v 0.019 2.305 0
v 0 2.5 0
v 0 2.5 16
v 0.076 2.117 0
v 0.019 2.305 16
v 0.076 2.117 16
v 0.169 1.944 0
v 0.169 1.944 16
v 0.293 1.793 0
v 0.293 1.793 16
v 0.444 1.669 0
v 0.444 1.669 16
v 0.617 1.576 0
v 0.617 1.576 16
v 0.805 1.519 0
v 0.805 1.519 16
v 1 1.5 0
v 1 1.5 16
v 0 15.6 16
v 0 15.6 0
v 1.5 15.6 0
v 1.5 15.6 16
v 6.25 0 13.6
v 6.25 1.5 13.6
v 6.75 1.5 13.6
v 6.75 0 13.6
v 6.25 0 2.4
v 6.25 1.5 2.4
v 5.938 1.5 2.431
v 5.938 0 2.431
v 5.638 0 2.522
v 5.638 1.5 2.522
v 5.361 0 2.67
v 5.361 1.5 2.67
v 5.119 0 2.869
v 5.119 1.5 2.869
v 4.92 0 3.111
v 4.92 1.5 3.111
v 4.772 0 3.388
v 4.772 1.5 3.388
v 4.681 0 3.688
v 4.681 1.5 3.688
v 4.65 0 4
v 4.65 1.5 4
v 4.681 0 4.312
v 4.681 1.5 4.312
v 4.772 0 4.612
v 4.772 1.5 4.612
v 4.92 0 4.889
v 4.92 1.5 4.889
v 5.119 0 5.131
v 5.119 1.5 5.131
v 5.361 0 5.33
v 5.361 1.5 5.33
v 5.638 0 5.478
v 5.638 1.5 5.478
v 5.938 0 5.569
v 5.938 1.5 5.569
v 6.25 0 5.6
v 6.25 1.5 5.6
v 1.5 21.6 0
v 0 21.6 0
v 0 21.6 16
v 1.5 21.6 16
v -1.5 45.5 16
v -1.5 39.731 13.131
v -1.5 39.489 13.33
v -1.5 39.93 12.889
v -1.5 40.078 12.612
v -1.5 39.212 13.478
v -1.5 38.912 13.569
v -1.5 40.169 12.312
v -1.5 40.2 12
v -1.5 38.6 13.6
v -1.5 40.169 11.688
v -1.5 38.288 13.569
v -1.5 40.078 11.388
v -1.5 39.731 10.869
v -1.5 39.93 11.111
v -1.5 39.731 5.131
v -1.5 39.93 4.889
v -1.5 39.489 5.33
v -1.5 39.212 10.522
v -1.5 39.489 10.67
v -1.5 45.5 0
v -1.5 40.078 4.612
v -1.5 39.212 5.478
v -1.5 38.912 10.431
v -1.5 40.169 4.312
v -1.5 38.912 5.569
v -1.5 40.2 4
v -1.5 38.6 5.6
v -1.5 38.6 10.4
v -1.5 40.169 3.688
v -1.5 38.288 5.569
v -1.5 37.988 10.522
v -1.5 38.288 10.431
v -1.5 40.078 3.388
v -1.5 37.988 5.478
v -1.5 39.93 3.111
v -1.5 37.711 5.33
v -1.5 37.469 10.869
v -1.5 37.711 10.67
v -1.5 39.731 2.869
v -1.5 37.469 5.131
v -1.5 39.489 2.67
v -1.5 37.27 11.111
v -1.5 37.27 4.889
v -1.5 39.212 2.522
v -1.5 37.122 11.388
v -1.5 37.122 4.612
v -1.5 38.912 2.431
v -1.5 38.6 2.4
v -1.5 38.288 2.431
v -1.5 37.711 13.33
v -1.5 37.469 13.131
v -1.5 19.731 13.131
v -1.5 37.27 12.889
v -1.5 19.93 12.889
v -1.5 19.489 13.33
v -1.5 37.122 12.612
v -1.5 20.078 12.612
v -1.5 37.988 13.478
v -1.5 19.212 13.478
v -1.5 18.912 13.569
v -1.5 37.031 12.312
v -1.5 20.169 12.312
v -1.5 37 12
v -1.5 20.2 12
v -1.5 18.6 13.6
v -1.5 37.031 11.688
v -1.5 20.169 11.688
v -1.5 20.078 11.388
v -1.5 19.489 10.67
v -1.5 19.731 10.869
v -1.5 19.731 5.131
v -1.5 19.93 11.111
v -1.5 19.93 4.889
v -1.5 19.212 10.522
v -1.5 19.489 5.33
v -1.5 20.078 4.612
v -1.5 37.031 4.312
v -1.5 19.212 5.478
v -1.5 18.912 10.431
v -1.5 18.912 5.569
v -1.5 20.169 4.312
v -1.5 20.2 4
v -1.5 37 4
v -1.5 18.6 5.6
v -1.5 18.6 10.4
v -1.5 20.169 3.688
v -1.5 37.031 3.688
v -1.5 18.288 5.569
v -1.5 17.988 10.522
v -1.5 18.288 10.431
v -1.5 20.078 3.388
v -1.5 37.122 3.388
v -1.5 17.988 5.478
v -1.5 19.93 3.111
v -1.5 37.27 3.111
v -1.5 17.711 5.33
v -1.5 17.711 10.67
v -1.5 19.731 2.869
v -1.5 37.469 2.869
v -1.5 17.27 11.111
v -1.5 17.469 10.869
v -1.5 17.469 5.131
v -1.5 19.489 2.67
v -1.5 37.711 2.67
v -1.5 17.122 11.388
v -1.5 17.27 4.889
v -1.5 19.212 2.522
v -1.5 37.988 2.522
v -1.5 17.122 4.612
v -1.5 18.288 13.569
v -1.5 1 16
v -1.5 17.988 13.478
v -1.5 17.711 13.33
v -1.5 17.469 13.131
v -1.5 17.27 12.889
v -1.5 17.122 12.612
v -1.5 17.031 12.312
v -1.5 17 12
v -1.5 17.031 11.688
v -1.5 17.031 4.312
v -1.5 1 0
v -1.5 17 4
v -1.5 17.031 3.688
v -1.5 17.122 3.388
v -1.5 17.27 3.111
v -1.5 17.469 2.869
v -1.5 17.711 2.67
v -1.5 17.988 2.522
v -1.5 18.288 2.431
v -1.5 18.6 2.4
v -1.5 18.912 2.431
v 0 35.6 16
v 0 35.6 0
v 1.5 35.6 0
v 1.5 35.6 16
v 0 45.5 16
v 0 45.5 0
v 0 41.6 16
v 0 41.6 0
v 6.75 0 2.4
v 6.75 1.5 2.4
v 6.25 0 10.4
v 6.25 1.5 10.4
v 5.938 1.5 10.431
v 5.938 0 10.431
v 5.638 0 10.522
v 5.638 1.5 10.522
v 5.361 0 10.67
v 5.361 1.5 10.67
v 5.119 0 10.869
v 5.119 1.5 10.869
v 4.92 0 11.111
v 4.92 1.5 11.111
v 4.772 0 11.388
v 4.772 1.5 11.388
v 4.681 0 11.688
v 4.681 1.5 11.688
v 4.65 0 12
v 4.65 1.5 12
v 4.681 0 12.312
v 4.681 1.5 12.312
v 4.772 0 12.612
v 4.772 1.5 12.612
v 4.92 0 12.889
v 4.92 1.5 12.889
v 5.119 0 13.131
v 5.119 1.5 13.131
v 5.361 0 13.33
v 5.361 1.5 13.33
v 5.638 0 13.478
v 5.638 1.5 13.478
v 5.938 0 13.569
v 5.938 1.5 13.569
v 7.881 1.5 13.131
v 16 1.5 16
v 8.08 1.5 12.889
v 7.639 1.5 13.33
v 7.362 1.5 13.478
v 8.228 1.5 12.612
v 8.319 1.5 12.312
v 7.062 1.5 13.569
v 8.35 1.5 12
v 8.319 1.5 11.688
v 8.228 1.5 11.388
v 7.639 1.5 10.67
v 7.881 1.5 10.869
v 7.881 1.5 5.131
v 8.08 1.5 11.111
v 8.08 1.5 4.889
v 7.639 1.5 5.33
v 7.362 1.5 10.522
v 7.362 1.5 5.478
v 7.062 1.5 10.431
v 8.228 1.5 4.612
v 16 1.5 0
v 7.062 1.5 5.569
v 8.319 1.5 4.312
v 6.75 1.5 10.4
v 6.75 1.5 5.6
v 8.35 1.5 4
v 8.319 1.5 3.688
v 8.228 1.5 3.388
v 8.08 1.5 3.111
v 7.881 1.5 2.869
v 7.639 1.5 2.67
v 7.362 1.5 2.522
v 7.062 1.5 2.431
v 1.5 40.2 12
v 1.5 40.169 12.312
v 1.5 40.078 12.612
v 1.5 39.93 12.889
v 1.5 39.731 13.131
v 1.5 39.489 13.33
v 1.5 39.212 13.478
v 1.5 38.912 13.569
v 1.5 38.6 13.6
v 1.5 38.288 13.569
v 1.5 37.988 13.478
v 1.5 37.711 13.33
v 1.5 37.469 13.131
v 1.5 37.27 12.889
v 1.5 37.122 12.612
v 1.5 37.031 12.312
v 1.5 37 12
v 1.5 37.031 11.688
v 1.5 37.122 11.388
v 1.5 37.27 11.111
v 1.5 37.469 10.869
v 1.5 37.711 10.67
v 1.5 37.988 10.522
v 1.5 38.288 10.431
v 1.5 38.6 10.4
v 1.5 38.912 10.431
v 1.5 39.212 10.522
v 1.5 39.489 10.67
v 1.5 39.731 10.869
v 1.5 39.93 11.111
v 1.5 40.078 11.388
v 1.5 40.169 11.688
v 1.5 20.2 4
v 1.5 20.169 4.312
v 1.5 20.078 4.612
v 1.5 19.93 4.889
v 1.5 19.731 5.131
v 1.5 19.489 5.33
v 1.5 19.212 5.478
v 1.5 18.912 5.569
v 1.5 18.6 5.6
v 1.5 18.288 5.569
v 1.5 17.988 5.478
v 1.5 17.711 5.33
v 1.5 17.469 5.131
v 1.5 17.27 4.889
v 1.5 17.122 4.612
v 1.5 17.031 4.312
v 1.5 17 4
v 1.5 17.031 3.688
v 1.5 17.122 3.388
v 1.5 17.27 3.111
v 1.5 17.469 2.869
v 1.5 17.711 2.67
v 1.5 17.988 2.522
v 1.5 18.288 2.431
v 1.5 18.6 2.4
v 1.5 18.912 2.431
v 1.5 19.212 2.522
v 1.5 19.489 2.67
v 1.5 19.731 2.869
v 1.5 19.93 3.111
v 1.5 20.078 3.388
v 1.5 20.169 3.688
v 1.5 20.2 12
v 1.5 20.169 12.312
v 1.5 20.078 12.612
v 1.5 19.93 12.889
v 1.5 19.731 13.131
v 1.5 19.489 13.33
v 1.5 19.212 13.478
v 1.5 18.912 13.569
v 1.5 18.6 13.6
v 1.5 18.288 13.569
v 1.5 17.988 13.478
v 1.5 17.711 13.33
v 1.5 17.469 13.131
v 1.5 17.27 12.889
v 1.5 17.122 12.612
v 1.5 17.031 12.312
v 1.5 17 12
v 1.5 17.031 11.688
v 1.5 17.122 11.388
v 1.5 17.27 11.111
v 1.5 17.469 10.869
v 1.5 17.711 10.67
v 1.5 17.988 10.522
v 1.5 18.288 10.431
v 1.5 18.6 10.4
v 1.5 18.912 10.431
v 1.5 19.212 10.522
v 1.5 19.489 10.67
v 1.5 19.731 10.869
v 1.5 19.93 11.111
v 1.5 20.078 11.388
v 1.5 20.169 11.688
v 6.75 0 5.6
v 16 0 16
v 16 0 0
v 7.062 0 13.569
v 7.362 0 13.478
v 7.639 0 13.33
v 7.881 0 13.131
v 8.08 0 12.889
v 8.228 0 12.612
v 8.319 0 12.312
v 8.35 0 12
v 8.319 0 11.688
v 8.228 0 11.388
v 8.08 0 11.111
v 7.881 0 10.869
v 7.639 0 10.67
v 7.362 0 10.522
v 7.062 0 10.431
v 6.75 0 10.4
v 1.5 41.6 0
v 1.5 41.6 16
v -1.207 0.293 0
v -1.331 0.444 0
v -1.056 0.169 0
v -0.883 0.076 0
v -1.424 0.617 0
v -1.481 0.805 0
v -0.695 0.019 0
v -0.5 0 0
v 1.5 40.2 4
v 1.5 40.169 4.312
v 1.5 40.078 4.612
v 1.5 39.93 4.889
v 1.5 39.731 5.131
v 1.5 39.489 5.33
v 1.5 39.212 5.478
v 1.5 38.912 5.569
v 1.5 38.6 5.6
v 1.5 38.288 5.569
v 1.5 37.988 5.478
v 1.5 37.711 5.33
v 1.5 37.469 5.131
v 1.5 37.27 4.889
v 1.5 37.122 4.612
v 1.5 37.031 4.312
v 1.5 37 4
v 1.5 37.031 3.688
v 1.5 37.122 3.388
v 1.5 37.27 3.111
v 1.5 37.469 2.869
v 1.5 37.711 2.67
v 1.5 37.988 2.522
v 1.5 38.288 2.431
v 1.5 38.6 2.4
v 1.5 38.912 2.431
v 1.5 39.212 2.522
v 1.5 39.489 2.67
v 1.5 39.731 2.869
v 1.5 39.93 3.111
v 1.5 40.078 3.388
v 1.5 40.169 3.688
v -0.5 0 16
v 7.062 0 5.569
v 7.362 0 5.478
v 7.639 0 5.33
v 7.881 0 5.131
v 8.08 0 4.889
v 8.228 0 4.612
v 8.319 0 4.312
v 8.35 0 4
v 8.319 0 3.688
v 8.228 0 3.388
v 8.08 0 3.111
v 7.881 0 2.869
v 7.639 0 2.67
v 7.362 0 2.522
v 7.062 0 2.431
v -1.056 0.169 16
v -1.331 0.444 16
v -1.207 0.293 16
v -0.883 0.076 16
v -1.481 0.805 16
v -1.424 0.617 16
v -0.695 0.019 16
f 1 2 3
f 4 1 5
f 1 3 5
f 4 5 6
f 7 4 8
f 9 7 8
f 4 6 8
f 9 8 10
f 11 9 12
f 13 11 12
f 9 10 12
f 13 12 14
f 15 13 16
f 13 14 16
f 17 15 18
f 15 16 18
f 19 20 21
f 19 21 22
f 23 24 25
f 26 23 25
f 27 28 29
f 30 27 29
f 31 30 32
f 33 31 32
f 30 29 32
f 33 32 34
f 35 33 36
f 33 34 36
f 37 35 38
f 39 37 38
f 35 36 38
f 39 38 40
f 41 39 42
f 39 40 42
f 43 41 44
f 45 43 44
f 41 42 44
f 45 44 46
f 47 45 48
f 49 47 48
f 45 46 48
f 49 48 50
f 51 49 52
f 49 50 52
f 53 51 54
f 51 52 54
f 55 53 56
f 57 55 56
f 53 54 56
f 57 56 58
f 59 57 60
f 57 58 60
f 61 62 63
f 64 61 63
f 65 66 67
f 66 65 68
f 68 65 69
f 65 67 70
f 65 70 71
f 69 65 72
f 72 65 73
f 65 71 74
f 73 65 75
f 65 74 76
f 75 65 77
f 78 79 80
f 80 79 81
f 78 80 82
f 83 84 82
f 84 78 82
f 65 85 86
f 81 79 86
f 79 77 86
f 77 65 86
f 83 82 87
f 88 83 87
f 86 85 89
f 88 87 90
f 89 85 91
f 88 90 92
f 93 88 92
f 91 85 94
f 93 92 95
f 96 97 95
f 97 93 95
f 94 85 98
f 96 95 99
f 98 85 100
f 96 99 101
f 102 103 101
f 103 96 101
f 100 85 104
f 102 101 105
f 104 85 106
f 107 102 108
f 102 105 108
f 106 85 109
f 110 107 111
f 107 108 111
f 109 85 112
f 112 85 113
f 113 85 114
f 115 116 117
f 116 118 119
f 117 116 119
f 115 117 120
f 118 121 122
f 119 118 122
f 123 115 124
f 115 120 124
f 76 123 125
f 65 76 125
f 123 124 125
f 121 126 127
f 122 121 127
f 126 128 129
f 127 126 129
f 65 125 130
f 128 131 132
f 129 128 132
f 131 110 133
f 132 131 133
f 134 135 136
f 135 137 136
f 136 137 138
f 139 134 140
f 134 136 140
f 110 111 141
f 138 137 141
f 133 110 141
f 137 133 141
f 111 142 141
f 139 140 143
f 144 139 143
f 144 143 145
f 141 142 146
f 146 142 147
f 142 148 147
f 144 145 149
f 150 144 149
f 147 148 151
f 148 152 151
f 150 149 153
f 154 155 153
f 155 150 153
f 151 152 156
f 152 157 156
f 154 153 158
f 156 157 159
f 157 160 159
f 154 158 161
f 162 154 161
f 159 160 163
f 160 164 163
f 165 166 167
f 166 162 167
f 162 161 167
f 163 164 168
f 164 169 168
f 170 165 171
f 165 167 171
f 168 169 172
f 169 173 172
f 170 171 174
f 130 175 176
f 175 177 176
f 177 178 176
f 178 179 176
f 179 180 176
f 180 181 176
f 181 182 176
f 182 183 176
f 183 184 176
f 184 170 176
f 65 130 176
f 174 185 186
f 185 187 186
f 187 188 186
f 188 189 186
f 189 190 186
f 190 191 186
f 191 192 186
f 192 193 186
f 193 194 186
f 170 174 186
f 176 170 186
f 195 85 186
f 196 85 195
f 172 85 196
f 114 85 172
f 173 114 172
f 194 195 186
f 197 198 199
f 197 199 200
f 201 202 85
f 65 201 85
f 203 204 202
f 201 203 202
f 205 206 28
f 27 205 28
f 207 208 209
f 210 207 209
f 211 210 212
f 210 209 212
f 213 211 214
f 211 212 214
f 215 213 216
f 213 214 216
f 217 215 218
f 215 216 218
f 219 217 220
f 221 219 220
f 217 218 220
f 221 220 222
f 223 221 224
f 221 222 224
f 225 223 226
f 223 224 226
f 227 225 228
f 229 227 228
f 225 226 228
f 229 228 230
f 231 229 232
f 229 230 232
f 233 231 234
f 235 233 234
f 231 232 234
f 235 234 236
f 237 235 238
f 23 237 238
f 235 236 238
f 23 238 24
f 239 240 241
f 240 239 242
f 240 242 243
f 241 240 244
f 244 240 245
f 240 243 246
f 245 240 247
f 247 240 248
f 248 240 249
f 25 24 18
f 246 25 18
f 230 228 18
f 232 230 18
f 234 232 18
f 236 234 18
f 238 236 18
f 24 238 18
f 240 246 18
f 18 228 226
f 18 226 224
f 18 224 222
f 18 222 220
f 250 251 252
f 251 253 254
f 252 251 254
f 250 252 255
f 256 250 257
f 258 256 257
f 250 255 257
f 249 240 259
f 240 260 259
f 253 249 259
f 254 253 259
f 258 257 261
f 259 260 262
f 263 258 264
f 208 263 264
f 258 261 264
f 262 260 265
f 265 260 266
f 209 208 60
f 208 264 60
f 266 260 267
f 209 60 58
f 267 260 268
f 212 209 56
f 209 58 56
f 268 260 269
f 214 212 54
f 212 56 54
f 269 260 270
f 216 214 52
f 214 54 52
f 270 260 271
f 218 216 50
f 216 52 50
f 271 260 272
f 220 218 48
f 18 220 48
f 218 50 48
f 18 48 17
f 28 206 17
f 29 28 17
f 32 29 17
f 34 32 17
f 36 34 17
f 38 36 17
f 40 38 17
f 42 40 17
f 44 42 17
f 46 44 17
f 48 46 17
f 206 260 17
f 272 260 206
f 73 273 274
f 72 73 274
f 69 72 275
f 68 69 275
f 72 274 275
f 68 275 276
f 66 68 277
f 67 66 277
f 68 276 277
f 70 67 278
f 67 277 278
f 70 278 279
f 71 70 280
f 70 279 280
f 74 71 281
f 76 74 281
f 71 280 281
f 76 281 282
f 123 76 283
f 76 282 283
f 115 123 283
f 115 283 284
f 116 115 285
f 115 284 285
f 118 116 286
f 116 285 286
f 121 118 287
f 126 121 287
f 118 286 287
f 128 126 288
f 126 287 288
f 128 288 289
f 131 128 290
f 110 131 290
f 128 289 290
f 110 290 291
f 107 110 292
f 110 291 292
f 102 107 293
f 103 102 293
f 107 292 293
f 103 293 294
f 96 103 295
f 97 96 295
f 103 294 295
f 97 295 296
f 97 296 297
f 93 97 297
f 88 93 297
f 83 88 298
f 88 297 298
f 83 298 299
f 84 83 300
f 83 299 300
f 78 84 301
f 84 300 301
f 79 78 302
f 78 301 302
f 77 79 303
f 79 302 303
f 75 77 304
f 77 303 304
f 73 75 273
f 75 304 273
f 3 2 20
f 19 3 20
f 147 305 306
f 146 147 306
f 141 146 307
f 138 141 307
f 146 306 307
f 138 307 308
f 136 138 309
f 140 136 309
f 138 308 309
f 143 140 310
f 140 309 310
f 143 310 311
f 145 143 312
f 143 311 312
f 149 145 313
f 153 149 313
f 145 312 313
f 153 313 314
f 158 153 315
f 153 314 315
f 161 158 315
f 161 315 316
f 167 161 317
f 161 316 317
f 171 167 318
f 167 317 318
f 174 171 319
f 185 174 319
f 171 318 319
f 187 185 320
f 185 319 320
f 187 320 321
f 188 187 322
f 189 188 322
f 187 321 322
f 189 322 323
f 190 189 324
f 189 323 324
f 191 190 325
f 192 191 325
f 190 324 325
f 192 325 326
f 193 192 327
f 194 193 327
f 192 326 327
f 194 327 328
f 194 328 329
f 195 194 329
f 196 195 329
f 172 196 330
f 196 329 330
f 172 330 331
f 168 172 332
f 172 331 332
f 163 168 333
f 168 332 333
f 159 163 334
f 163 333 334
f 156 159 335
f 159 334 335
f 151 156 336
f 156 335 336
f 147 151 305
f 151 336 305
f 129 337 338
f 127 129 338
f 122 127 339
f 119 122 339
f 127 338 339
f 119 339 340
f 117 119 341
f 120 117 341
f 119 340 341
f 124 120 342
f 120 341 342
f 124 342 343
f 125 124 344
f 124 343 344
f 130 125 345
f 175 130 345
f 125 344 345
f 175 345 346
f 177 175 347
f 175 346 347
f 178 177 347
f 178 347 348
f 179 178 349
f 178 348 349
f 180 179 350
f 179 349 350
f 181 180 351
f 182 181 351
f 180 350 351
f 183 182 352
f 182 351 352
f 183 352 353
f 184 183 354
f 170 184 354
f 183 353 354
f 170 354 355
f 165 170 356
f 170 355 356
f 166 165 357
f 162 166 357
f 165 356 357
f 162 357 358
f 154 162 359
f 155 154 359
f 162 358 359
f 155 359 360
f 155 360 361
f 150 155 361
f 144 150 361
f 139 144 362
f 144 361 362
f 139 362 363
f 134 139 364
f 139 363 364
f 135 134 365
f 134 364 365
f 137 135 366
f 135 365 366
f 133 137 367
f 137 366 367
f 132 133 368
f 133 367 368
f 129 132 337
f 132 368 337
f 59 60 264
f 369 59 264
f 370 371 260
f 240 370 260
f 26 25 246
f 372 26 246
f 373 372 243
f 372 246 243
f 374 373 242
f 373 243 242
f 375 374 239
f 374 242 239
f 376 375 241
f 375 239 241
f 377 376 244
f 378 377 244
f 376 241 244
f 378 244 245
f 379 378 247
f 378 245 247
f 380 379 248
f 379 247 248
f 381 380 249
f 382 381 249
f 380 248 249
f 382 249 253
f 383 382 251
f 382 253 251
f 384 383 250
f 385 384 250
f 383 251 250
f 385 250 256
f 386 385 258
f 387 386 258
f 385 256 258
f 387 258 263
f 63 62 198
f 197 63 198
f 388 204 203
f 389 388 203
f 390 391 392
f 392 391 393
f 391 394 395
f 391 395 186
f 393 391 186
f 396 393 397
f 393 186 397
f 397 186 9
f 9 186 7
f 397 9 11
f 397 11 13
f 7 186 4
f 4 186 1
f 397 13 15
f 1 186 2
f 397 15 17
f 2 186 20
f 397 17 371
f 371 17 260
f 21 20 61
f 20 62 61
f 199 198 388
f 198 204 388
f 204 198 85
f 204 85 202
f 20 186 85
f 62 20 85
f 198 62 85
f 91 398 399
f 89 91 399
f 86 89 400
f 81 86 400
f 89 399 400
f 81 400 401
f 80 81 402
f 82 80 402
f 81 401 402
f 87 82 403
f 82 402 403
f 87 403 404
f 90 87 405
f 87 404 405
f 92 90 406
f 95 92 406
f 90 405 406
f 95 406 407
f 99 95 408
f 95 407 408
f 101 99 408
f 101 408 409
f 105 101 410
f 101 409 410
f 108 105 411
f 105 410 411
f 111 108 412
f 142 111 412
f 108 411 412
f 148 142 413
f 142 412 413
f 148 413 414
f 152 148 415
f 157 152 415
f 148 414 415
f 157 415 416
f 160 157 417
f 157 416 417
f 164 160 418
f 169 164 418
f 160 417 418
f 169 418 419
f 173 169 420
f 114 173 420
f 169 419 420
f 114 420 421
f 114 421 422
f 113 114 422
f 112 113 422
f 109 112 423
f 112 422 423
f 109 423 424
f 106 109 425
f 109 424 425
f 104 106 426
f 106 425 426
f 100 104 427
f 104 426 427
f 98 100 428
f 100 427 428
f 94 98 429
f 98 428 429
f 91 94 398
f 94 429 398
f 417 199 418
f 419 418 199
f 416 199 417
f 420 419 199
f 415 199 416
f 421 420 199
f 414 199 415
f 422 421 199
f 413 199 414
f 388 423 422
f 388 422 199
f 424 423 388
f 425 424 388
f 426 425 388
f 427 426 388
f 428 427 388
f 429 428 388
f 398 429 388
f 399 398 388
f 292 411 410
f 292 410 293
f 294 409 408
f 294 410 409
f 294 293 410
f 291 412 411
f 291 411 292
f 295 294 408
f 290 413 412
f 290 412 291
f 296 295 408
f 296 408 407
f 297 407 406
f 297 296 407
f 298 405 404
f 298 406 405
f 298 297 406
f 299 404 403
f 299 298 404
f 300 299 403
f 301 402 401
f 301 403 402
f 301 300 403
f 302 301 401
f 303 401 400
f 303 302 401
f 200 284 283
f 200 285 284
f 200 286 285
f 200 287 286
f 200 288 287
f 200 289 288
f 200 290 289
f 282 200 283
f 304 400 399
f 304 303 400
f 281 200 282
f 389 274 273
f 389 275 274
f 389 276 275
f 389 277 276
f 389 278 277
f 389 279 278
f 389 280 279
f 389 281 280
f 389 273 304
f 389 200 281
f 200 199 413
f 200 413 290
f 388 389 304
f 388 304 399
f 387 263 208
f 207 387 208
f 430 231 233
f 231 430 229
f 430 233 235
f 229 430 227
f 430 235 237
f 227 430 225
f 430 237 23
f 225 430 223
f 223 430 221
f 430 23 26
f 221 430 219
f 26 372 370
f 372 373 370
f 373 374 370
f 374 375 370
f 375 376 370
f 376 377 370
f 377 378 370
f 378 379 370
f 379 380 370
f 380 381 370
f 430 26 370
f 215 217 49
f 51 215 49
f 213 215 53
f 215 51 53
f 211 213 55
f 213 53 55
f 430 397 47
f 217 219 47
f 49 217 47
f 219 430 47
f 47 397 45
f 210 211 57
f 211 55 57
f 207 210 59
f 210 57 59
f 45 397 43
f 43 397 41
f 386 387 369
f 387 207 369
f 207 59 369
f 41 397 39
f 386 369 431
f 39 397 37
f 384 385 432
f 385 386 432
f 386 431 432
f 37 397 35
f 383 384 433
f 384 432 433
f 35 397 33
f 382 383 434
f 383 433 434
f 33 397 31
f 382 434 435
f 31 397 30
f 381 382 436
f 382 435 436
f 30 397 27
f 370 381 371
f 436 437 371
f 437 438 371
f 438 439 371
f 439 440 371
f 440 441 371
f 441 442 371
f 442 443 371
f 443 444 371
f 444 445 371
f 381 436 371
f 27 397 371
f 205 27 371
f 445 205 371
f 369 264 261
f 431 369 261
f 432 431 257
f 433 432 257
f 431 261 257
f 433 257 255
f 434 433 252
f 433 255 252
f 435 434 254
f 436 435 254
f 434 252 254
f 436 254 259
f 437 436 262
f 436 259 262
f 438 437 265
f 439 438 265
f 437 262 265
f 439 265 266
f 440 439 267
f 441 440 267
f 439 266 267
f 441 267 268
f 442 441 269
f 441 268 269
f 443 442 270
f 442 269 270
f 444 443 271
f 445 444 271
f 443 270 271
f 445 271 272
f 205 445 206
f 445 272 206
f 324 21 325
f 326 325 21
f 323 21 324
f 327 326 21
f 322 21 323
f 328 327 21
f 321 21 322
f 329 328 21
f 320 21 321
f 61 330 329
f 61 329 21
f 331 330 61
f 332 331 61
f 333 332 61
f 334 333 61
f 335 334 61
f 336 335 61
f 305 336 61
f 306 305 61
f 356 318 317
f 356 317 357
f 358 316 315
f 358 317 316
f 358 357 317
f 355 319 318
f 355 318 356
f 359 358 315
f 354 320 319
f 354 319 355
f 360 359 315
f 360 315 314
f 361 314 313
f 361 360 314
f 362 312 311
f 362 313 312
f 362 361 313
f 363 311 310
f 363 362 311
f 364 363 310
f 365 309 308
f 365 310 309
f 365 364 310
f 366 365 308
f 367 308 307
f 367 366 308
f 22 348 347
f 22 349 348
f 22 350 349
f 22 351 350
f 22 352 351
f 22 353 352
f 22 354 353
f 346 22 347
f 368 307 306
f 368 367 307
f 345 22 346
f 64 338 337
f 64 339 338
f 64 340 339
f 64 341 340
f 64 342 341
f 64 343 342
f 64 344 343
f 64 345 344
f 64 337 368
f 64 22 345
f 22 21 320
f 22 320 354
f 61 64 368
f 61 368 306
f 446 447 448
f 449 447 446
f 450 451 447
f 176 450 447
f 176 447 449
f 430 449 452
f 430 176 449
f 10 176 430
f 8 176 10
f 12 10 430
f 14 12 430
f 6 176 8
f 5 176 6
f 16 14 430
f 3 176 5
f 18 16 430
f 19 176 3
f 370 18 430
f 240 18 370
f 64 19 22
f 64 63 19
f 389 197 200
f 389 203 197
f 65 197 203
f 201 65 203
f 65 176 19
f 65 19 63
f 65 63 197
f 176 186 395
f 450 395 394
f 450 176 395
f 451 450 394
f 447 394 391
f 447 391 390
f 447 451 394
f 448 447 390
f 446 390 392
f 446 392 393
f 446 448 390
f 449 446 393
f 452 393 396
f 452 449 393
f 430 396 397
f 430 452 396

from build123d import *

# Parameters (mm, degrees)
F1_DEPTH = 16
F2_R     = 1
F3_R     = 1
F5_DEPTH = 1.5
F6_W     = 6
F6_H     = 16
F7_DEPTH = 1.5
F8_R     = 1.6
F9_DEPTH = 3


with BuildPart() as f1:
    # F0 (on Top) → F1 (new body)
    with BuildSketch(Plane.XY):
        Polygon((0, 1.5), (0, 45.5), (-1.5, 45.5), (-1.5, 0), (16, 0), (16, 1.5), align=None)
    extrude(amount=F1_DEPTH)

    # F2
    f2_edges = [f1.edges().sort_by_distance(p)[0] for p in [
        (-1.5, 0, 8),
    ]]
    fillet(f2_edges, radius=F2_R)

    # F3
    f3_edges = [f1.edges().sort_by_distance(p)[0] for p in [
        (0, 1.5, 8),
    ]]
    fillet(f3_edges, radius=F3_R)

    # F4 (on face) → F5 (cut)
    with BuildSketch(Plane(origin=(0, 1.5, 0), x_dir=(-1, 0, 0), z_dir=(0, 1, 0))):
        with BuildLine():
            ThreePointArc((-6.75, 5.6), (-8.35, 4), (-6.75, 2.4))
            Line((-6.75, 2.4), (-6.25, 2.4))
            ThreePointArc((-6.25, 2.4), (-4.65, 4), (-6.25, 5.6))
            Line((-6.25, 5.6), (-6.75, 5.6))
        make_face()
        with BuildLine():
            ThreePointArc((-6.75, 13.6), (-8.35, 12), (-6.75, 10.4))
            Line((-6.75, 10.4), (-6.25, 10.4))
            ThreePointArc((-6.25, 10.4), (-4.65, 12), (-6.25, 13.6))
            Line((-6.25, 13.6), (-6.75, 13.6))
        make_face()
    extrude(amount=-F5_DEPTH, mode=Mode.SUBTRACT)

    # F6 (on face) → F7 (join)
    with BuildSketch(Plane.YZ):
        with Locations((38.6, 8)):
            Rectangle(F6_W, F6_H)
        with Locations((18.6, 8)):
            Rectangle(F6_W, F6_H)
    extrude(amount=F7_DEPTH)

    # F8 (on face) → F9 (cut)
    with BuildSketch(Plane.YZ.offset(1.5)):
        with Locations((38.6, 12)):
            Circle(F8_R)
        with Locations((38.6, 4)):
            Circle(F8_R)
        with Locations((18.6, 12)):
            Circle(F8_R)
        with Locations((18.6, 4)):
            Circle(F8_R)
    extrude(amount=-F9_DEPTH, mode=Mode.SUBTRACT)


solid = f1.part
